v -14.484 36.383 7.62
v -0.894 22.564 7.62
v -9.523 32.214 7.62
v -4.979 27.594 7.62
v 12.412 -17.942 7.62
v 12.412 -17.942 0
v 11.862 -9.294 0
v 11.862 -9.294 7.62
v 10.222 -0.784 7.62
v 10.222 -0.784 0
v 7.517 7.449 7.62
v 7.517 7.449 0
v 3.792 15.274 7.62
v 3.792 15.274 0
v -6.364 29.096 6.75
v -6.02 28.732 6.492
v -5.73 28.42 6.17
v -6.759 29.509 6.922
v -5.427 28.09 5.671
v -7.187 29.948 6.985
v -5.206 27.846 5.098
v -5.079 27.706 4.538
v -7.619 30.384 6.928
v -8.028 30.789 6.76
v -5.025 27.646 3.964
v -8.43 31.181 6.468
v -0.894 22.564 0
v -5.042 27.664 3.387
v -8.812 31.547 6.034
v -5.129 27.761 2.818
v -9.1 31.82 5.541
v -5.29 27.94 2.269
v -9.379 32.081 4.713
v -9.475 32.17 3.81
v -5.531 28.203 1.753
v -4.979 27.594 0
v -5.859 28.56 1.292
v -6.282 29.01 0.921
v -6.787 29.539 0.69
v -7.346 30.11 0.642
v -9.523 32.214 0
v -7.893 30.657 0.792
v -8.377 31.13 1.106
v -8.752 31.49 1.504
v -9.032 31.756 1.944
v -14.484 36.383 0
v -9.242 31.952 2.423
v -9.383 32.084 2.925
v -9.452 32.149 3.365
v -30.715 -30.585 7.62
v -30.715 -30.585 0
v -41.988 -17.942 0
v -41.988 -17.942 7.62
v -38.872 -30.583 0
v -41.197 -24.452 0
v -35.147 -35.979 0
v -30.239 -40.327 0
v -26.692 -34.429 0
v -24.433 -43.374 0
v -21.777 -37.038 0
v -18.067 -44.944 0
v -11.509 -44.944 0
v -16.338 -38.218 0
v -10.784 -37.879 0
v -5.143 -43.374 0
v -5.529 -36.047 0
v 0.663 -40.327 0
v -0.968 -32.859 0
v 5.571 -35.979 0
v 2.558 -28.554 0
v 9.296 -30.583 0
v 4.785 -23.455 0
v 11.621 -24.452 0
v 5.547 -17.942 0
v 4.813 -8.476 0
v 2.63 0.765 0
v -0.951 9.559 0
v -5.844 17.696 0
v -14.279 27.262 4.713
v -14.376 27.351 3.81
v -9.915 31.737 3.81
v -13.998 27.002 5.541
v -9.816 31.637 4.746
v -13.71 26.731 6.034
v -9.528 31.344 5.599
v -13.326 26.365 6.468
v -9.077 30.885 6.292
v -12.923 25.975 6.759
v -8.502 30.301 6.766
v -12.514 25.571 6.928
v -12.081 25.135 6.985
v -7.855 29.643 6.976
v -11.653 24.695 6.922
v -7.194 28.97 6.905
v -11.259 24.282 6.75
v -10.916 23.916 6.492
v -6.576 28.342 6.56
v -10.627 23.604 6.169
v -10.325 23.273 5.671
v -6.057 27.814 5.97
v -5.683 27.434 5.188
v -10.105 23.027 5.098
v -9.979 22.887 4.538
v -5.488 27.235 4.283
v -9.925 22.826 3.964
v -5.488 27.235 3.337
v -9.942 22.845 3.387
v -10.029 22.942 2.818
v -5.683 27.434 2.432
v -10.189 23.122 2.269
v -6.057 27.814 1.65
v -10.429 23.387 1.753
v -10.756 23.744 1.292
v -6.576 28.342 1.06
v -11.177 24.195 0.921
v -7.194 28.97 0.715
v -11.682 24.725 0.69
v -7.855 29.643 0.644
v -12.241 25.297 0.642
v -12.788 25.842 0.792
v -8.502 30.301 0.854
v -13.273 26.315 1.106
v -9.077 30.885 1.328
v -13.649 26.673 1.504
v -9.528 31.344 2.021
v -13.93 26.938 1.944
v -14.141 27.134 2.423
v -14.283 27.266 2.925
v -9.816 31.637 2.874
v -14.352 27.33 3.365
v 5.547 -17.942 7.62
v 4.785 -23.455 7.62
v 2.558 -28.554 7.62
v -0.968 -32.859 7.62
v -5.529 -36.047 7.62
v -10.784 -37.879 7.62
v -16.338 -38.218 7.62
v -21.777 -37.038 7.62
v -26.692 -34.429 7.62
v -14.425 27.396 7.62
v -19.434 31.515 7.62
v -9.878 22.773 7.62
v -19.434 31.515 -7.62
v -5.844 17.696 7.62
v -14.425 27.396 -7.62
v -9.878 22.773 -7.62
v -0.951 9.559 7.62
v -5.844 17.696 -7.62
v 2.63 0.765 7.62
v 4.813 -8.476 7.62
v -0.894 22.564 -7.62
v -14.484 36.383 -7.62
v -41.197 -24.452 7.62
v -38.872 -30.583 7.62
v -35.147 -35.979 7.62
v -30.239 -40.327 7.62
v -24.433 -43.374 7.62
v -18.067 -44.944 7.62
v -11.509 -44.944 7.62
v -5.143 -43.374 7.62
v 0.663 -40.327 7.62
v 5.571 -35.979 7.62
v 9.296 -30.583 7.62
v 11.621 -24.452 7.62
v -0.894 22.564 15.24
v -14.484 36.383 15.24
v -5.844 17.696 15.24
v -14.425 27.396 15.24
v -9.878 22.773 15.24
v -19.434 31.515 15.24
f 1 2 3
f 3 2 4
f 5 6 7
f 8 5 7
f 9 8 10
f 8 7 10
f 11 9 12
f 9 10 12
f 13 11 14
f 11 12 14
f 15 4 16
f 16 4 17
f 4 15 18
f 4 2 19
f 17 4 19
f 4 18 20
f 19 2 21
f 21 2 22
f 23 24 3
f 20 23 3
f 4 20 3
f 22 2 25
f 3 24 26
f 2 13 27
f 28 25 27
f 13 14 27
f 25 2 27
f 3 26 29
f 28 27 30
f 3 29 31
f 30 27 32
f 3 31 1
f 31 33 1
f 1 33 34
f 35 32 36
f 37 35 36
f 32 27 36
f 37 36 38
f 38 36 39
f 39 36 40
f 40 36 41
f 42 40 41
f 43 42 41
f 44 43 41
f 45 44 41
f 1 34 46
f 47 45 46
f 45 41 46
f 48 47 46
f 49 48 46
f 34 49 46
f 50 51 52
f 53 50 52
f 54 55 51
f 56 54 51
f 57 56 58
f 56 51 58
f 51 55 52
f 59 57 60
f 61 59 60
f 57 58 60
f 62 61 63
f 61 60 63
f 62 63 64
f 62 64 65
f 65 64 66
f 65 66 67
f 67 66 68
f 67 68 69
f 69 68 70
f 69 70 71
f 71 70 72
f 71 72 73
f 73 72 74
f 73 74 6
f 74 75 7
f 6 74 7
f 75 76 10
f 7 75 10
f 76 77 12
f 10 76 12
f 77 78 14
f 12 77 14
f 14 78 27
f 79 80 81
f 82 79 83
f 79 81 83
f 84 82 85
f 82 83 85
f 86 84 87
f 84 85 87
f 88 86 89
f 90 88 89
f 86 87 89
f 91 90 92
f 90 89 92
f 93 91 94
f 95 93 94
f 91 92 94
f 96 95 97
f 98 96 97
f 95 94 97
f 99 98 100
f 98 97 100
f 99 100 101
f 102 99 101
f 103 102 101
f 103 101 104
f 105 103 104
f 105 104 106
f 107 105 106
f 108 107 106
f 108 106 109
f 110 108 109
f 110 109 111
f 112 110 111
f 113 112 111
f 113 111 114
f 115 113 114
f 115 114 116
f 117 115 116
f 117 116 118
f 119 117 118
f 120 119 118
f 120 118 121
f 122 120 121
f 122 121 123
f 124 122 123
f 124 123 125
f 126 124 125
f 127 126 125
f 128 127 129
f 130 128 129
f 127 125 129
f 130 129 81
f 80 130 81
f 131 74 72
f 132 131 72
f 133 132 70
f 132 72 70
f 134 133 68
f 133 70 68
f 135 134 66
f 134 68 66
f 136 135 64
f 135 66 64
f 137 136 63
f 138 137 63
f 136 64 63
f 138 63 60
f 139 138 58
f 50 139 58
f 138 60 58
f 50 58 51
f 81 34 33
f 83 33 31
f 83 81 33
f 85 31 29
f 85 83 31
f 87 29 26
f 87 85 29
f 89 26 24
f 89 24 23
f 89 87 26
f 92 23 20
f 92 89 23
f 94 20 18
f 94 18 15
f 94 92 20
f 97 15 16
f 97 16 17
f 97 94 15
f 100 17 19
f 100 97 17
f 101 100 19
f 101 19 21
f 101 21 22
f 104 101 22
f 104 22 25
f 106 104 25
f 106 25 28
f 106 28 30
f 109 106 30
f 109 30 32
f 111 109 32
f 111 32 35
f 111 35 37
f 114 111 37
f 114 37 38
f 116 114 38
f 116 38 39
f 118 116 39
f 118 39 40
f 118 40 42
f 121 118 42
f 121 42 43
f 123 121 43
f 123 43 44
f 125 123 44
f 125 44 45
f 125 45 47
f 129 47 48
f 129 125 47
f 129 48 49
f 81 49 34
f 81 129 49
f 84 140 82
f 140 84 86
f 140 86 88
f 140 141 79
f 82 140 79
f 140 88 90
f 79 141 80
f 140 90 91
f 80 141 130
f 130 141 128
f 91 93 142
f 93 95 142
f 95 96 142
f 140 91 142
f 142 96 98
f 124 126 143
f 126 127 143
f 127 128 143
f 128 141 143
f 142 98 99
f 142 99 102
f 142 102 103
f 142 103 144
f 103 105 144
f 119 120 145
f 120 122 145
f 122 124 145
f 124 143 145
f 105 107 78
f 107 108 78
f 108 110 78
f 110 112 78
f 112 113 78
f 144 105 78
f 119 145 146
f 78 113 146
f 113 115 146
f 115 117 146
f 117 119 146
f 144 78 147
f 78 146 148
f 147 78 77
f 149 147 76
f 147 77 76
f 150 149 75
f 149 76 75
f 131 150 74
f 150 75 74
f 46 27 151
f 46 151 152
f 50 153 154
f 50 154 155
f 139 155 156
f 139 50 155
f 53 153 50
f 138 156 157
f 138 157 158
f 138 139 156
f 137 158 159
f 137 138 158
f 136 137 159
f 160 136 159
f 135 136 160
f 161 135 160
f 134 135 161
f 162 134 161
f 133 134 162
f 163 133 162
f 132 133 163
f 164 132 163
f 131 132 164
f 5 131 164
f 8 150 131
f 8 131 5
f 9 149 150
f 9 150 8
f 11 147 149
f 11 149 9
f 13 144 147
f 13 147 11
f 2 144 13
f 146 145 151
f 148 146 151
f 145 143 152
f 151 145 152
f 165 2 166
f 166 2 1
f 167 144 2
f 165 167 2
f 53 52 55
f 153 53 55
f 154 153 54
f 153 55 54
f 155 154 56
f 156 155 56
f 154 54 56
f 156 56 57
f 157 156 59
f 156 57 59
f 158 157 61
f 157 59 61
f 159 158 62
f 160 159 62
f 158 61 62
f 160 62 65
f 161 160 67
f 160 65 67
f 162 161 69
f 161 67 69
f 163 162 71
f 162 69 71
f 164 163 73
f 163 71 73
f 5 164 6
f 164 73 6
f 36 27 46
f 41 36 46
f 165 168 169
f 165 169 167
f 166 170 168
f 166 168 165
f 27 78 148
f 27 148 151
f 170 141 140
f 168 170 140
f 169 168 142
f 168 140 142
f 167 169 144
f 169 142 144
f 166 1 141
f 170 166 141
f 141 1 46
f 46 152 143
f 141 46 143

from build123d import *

# Parameters (mm, degrees)
F1_DEPTH      = 7.62
F3_DEPTH      = 7.62
F3_DEPTH_BACK = 15.24
F4_R          = 3.175
F5_DEPTH      = 79.502
F5_DEPTH_BACK = 34.798


with BuildPart() as f1:
    # F0 (on Top) → F1 (new body)
    with BuildSketch(Plane.XY):
        with BuildLine():
            ThreePointArc((-19.4344986555, 31.5148568491), (-1.0529688957, 9.7617744234), (5.5467668246, -17.9423898801))
            ThreePointArc((5.5467668246, -17.9423898801), (-8.0937566855, -37.1436695543), (-30.7152286304, -30.5845514882))
            Line((-30.7152286304, -30.5845514882), (-41.9875042541, -17.9423898801))
            ThreePointArc((-41.9875042541, -17.9423898801), (-14.7879740797, -45.1419200544), (12.4115560946, -17.9423898801))
            ThreePointArc((12.4115560946, -17.9423898801), (5.3194072823, 12.3671165466), (-14.4844366655, 36.3832053102))
            Line((-14.4844366655, 36.3832053102), (-19.4344986555, 31.5148568491))
        make_face()
    extrude(amount=F1_DEPTH)

    # F2 (on face) → F3 (join, two sides)
    with BuildSketch(Plane.XY.offset(7.62)) as f3_sk:
        with BuildLine():
            Line((-0.8935400487, 22.5641902395), (-14.4844366655, 36.3832053102))
            Line((-14.4844366655, 36.3832053102), (-19.4344986555, 31.5148568491))
            ThreePointArc((-19.4344986555, 31.5148568491), (-12.0907540568, 25.1445945609), (-5.8436020388, 17.6958417784))
            Line((-5.8436020388, 17.6958417784), (-0.8935400487, 22.5641902395))
        make_face()
    extrude(amount=F3_DEPTH)
    extrude(f3_sk.sketch, amount=-F3_DEPTH_BACK)

    # F4 (on face) → F5 (cut, two sides)
    with BuildSketch(Plane(origin=(10.8263263702, 10.6476099552, 0), x_dir=(-0.7011976155, 0.7129669726, 0), z_dir=(0.7129669726, 0.7011976155, 0))) as f5_sk:
        with Locations((26.4052733757, 3.81)):
            Circle(F4_R)
    extrude(amount=-F5_DEPTH, mode=Mode.SUBTRACT)
    extrude(f5_sk.sketch, amount=F5_DEPTH_BACK, mode=Mode.SUBTRACT)


solid = f1.part
